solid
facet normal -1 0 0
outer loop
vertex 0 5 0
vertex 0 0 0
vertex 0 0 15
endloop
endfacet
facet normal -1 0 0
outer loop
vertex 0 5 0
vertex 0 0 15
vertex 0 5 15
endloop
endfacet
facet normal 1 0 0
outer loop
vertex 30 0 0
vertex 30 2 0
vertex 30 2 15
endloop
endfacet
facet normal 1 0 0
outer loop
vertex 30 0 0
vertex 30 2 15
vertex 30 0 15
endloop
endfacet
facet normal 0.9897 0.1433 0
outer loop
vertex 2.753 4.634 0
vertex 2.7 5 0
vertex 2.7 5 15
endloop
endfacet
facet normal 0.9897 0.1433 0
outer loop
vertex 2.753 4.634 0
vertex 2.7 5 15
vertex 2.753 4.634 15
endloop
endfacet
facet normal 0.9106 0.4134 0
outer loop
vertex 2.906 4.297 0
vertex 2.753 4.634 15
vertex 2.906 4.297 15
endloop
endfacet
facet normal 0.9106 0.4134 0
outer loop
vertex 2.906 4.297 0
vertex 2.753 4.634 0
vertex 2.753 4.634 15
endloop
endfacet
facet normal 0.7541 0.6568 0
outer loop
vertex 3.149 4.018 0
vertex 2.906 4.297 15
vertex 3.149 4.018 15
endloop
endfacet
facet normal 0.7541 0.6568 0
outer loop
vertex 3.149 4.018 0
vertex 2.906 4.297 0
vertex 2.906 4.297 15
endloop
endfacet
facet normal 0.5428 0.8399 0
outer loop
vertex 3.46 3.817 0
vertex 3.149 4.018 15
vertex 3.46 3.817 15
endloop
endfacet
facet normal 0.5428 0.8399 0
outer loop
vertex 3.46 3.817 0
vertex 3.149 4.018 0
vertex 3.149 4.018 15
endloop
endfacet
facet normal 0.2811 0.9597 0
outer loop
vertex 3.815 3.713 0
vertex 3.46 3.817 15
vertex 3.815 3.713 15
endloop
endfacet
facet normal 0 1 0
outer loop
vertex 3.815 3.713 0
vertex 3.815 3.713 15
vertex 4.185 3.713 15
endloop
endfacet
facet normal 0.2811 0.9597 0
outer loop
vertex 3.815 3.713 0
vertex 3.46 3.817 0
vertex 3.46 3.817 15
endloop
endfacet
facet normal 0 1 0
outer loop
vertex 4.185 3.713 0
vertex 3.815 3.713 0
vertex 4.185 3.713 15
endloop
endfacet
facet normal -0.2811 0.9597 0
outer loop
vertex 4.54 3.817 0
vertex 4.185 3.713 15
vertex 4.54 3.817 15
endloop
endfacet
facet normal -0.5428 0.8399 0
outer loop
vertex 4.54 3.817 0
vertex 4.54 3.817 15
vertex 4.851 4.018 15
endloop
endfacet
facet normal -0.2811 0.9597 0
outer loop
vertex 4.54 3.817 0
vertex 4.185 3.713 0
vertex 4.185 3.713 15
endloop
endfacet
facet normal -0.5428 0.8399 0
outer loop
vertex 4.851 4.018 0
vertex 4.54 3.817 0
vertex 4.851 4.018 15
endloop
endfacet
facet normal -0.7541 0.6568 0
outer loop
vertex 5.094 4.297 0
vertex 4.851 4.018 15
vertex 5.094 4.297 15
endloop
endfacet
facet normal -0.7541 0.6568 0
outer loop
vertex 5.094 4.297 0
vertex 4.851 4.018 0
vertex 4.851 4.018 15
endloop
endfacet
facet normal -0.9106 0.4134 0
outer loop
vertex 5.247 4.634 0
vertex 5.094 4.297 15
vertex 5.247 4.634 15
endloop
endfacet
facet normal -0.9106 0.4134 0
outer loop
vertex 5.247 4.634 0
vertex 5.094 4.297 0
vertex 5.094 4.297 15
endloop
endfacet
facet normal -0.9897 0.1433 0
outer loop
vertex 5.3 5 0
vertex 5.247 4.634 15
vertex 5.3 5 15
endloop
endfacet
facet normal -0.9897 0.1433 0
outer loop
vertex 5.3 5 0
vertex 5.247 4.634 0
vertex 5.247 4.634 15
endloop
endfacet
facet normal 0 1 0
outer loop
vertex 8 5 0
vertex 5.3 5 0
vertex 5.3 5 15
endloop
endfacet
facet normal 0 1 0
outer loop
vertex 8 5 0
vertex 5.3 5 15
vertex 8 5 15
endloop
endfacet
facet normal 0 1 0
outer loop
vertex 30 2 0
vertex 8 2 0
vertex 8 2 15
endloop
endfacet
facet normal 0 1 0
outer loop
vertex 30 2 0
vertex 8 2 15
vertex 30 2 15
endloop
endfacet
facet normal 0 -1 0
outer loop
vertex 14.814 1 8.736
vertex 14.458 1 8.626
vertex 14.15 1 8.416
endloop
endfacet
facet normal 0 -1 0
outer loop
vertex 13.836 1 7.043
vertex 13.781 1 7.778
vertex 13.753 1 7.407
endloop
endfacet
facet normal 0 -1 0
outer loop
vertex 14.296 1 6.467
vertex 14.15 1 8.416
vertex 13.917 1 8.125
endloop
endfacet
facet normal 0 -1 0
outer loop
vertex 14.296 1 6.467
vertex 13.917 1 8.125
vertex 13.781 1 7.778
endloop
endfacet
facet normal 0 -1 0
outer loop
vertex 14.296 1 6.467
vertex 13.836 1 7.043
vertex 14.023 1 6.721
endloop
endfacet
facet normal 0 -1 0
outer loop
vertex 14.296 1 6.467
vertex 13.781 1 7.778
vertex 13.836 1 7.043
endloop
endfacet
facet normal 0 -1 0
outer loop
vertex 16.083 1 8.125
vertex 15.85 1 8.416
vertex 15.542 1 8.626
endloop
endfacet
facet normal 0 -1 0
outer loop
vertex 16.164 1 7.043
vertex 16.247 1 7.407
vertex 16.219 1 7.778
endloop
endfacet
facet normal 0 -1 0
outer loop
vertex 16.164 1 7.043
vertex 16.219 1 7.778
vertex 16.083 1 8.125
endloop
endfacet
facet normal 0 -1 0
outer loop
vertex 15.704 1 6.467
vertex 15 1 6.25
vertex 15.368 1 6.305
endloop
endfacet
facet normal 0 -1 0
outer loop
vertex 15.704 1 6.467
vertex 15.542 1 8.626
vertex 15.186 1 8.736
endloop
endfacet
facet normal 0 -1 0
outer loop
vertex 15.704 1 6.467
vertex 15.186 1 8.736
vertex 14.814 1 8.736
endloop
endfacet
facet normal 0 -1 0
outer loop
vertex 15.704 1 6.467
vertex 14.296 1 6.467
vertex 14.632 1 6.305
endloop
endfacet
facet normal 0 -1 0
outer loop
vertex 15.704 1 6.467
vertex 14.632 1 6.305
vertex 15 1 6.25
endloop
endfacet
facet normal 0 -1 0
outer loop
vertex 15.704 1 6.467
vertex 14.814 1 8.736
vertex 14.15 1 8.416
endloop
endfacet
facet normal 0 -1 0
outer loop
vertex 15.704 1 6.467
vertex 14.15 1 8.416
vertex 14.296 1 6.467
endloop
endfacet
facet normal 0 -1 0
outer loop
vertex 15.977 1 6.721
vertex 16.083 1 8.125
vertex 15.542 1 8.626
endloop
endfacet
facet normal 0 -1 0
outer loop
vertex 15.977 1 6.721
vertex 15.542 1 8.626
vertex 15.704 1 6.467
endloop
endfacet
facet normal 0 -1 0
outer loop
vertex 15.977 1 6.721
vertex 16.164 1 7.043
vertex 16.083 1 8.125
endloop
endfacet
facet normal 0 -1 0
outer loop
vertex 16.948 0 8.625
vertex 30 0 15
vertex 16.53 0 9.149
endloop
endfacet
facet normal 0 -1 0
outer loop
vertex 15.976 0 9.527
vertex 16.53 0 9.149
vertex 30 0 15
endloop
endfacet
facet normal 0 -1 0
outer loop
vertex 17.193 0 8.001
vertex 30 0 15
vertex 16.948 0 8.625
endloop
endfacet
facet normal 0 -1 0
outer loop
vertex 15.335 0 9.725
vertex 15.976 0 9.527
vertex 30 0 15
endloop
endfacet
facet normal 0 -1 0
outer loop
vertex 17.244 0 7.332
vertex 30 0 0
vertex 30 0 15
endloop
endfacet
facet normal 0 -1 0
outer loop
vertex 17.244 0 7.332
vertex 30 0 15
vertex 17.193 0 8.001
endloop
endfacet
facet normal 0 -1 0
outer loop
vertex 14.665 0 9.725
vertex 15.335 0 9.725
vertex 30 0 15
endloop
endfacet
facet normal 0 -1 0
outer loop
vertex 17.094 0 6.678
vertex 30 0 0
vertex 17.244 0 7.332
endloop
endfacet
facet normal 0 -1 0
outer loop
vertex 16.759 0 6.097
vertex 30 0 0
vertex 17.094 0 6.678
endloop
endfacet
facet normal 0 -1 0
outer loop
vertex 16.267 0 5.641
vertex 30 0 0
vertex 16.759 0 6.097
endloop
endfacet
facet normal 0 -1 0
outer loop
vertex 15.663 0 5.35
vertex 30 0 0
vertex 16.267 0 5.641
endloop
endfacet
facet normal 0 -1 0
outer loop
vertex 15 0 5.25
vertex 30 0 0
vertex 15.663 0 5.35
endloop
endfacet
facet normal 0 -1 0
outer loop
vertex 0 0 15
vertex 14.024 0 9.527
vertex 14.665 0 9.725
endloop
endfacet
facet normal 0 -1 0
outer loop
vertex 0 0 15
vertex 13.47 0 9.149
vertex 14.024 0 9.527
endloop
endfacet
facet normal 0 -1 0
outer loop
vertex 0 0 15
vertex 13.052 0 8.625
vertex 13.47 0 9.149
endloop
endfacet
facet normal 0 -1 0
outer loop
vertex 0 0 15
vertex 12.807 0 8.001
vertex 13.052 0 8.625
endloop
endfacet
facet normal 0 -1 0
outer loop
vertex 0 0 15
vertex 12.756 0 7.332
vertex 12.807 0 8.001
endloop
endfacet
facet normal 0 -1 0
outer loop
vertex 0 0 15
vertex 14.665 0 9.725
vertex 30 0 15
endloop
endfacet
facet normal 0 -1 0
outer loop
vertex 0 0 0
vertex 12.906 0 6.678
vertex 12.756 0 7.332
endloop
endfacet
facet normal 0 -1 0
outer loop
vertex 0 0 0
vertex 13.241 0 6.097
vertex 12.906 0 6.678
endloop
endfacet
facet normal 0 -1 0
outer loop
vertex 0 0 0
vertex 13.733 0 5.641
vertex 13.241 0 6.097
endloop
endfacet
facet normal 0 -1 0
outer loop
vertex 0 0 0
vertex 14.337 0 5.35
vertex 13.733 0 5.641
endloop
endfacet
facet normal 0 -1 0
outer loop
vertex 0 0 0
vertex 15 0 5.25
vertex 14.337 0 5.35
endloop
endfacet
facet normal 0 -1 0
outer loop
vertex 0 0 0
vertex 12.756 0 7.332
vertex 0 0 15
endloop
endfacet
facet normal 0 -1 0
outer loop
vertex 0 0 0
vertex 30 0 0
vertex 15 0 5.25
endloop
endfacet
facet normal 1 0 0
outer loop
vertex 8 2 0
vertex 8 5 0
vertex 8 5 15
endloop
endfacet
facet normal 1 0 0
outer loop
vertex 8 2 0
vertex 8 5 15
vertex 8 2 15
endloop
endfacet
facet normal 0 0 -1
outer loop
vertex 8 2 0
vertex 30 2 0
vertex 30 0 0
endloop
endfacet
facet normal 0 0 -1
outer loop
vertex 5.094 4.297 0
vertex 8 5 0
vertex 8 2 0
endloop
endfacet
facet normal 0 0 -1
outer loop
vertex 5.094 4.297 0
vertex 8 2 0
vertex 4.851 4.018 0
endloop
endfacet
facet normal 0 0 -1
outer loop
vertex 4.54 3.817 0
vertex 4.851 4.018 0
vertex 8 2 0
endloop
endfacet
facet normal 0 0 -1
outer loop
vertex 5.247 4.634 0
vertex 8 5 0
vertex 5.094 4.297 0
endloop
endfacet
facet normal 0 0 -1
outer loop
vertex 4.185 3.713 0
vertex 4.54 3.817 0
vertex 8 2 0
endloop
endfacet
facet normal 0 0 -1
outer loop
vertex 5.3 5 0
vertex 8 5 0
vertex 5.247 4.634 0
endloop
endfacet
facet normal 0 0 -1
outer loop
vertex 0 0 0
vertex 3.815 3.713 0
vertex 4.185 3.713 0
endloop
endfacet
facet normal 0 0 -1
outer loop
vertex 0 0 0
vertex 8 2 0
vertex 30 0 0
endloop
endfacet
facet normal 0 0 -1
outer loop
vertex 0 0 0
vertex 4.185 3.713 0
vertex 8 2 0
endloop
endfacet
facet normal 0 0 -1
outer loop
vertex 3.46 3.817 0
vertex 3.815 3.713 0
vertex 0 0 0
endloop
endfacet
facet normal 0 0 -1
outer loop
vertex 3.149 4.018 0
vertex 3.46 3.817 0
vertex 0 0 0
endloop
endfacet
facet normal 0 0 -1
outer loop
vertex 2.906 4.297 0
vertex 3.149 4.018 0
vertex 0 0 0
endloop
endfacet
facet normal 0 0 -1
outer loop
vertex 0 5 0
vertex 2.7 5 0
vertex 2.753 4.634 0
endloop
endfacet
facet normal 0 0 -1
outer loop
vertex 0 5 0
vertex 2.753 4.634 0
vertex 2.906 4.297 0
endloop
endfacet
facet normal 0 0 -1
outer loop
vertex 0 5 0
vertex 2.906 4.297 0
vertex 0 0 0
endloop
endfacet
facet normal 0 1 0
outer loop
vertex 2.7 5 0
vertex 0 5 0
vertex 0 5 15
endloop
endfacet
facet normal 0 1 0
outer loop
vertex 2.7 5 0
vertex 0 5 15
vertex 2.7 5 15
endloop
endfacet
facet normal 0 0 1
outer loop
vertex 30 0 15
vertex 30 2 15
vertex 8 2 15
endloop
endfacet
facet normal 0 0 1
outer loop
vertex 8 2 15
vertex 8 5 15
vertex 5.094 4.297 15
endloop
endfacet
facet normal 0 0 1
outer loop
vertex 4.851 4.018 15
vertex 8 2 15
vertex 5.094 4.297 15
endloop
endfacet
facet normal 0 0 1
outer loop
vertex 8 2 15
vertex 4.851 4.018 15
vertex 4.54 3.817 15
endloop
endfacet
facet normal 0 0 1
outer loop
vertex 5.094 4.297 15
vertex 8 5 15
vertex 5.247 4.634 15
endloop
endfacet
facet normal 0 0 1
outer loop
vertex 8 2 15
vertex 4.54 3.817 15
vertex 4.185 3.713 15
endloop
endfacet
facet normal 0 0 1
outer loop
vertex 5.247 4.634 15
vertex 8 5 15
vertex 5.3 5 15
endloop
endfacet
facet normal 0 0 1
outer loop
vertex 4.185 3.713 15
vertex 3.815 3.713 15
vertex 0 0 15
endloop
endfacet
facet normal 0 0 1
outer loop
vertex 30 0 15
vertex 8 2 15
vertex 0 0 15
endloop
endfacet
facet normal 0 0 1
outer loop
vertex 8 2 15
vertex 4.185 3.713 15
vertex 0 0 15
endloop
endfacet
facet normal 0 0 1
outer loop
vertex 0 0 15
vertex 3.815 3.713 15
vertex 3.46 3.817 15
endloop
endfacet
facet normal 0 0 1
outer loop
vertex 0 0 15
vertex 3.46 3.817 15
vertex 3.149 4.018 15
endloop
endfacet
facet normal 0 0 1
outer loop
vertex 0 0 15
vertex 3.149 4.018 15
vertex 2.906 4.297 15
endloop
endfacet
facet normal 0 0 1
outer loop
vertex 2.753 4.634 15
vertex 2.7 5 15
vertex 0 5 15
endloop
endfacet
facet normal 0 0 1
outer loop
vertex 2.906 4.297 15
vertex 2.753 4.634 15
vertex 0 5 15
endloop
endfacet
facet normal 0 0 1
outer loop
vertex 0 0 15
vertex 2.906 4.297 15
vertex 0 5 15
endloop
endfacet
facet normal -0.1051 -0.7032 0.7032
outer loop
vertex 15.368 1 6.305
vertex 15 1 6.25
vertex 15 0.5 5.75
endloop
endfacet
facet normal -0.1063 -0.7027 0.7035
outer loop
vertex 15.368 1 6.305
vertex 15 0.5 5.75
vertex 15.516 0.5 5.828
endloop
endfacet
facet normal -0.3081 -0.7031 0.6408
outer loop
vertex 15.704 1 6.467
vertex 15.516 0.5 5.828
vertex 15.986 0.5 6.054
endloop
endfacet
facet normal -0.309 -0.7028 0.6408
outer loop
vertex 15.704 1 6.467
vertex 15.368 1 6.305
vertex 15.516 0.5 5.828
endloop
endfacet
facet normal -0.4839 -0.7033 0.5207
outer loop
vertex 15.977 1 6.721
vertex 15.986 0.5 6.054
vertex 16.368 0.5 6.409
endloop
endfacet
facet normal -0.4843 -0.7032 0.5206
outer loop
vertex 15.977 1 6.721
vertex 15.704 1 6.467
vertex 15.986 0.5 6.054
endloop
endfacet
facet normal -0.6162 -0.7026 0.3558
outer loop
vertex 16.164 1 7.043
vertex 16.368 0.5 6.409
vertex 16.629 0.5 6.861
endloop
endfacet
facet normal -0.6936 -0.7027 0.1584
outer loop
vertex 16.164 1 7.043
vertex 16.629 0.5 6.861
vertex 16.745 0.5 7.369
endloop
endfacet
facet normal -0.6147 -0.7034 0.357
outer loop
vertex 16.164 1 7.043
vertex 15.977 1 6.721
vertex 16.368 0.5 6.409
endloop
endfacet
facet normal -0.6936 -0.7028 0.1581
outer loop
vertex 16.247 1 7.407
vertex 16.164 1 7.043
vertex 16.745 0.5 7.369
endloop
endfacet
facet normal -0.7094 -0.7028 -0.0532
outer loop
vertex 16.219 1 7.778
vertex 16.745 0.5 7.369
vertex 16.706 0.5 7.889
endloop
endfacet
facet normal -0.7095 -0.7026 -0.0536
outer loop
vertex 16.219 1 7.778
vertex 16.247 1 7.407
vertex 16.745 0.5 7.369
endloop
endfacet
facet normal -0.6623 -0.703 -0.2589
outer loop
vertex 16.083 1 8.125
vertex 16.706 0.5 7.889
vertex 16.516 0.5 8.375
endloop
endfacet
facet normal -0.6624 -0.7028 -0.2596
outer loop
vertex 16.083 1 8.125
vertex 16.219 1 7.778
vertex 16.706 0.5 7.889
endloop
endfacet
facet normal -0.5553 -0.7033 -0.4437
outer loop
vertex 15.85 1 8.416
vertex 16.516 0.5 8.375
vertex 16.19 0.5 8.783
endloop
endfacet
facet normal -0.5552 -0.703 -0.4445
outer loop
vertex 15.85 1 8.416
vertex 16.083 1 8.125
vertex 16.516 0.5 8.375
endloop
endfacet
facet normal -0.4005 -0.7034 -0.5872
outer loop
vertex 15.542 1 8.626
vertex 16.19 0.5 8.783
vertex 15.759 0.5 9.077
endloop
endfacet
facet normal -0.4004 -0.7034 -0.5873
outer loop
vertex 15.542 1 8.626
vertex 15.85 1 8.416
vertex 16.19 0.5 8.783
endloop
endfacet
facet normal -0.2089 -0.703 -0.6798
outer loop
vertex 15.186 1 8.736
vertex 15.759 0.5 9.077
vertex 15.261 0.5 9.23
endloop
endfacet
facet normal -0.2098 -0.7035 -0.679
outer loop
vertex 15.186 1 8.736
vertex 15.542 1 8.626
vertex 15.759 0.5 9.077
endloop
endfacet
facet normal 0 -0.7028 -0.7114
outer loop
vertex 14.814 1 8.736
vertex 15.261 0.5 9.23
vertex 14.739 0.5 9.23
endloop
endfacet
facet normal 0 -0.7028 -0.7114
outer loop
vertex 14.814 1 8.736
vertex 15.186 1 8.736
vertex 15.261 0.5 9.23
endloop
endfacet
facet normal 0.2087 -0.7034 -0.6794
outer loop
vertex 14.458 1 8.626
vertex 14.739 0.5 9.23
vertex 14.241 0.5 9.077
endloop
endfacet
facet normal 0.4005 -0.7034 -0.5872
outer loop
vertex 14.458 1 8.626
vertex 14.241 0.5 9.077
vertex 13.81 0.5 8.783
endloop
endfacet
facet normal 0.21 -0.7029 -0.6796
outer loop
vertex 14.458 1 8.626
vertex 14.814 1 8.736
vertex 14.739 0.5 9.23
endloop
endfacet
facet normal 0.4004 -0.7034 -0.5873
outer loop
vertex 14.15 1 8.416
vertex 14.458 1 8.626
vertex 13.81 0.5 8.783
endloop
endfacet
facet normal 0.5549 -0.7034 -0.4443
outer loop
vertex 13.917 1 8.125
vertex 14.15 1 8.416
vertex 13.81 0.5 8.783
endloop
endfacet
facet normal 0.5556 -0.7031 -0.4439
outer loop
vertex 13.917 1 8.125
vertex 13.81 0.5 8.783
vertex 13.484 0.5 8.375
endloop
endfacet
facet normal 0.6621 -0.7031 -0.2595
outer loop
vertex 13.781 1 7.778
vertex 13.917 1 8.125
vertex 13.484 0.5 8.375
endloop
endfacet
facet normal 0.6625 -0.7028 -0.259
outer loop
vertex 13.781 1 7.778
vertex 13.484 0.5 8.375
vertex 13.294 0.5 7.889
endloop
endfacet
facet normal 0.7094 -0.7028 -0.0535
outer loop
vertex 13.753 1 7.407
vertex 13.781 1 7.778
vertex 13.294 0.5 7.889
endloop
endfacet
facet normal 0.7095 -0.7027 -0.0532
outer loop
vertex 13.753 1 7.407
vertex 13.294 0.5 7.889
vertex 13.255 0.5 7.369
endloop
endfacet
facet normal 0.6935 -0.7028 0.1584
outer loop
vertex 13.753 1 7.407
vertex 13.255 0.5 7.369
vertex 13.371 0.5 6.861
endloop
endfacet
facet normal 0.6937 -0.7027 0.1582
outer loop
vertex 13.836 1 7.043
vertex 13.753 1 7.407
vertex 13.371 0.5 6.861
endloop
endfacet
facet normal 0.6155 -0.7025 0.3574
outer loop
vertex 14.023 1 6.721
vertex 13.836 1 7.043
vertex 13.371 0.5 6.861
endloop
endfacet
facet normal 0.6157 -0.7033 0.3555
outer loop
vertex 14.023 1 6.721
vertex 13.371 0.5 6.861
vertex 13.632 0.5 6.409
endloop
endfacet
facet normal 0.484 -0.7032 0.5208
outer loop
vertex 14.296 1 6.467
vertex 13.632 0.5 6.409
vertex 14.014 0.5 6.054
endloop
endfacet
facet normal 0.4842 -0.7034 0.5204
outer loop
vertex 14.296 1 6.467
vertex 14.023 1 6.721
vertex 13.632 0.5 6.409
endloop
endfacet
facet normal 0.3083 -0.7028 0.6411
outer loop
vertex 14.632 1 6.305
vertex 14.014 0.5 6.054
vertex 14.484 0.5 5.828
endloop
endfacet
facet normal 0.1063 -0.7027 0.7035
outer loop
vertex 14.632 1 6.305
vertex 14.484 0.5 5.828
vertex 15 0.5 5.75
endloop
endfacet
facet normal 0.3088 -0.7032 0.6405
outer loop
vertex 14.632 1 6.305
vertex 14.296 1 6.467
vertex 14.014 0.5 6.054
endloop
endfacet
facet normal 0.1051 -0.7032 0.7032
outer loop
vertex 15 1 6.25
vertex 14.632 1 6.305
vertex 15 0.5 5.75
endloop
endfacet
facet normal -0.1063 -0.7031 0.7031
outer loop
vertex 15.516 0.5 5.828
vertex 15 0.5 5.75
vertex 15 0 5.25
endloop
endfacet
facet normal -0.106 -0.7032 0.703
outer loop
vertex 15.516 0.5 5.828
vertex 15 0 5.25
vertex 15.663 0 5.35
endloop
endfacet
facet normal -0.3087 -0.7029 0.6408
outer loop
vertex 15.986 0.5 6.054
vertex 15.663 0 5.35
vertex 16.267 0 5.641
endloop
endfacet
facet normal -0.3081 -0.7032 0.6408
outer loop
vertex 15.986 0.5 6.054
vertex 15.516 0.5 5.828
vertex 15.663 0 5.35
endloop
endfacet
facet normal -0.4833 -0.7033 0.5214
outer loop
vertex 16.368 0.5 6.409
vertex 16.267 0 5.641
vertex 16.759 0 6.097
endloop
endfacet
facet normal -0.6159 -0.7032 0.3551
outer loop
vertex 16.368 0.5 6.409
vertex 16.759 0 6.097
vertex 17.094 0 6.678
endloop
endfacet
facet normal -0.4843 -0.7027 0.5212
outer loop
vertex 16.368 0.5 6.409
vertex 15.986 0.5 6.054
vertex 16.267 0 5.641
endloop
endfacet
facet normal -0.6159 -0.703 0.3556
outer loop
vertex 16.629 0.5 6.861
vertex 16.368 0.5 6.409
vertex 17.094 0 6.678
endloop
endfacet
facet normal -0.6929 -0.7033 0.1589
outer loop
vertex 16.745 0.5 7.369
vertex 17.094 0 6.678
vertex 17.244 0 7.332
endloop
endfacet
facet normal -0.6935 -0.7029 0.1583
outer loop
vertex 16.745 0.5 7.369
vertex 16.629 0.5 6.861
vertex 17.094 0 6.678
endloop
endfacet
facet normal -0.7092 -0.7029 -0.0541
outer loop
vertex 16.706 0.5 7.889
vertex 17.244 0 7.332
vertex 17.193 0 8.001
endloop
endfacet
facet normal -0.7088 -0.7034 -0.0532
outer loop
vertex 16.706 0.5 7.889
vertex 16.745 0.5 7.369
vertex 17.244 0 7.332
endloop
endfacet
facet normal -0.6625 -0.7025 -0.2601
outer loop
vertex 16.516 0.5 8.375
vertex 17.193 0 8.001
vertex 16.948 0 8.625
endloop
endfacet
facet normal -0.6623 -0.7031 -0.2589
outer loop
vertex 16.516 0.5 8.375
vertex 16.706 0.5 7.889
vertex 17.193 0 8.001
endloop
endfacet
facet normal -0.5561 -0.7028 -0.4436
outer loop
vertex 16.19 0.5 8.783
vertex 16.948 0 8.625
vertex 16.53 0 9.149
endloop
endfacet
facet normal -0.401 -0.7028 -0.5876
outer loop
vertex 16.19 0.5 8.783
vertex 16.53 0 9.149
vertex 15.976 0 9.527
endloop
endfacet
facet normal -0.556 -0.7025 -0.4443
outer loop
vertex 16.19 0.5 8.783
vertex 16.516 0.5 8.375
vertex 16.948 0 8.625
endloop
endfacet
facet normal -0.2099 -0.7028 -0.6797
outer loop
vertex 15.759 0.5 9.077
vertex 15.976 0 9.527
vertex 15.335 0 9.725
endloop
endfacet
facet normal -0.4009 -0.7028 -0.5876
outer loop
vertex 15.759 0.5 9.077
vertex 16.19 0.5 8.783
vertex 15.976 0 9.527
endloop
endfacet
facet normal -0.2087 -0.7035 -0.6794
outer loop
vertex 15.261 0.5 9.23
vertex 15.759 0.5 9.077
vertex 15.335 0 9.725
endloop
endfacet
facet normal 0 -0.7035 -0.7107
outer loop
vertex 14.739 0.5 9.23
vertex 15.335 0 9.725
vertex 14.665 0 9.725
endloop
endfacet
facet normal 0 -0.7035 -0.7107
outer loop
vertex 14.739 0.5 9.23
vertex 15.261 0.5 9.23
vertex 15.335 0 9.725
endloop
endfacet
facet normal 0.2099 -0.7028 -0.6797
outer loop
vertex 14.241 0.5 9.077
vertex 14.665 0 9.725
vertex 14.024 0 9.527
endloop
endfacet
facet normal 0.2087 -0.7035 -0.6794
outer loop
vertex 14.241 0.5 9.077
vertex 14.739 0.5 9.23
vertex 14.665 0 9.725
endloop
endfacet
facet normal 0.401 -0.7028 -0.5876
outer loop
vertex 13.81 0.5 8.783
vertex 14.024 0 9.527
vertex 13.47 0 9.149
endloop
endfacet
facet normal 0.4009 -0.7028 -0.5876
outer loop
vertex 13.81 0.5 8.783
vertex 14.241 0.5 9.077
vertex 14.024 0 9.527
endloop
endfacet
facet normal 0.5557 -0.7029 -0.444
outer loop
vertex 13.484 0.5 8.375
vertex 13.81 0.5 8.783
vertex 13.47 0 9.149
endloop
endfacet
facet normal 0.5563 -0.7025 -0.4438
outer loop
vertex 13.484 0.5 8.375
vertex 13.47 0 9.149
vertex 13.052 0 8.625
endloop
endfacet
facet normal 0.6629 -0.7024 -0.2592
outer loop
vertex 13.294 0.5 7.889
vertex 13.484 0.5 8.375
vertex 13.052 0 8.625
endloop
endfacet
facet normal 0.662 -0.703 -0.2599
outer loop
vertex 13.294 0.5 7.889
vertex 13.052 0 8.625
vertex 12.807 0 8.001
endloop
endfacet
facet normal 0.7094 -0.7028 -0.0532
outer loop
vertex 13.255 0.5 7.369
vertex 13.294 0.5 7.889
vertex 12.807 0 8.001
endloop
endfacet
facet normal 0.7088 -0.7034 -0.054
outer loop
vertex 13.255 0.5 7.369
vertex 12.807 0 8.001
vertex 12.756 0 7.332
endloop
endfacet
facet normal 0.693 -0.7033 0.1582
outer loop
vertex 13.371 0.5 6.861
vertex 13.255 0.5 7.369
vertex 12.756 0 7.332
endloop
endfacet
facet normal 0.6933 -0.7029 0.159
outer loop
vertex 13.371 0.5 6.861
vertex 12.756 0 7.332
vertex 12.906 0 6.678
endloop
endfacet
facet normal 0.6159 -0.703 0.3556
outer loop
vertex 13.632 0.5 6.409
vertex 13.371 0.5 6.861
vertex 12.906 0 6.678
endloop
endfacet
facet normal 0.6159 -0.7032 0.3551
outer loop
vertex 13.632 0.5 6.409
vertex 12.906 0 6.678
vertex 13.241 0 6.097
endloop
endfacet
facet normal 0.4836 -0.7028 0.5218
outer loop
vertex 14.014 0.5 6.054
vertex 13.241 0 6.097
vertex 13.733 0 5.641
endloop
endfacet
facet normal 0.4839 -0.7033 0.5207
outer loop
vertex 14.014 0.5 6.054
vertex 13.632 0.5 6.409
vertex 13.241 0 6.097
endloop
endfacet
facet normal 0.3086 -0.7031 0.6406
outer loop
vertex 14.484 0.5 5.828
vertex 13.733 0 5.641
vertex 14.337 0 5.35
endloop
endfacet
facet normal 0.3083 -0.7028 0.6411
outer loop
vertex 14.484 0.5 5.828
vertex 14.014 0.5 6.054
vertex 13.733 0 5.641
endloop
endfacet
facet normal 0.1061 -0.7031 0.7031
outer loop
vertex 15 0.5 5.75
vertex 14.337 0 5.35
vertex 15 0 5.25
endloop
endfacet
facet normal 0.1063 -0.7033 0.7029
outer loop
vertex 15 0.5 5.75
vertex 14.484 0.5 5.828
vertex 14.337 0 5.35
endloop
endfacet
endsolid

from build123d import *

# Parameters (mm, degrees)
BOSS_EXTRUDE1_DEPTH = 15
SKETCH3_R           = 1.75
CUT_EXTRUDE1_DEPTH  = 1
CHAMFER1_SIZE       = 0.5


with BuildPart() as part:
    # Sketch2 → Boss-Extrude1 (new body)
    with BuildSketch(Plane.XY):
        with BuildLine():
            Line((0, 0), (0, 5))
            Line((0, 5), (2.7, 5))
            ThreePointArc((2.7, 5), (4, 3.7), (5.3, 5))
            Line((5.3, 5), (8, 5))
            Line((8, 5), (8, 2))
            Line((8, 2), (30, 2))
            Line((30, 2), (30, 0))
            Line((30, 0), (0, 0))
        make_face()
    extrude(amount=BOSS_EXTRUDE1_DEPTH)

    # Sketch3 → Cut-Extrude1 (cut)
    with BuildSketch(Plane.XZ):
        with Locations(Location((15, 7.5, 0), (0, 0, 270))):
            Circle(SKETCH3_R)
    extrude(amount=-CUT_EXTRUDE1_DEPTH, mode=Mode.SUBTRACT)

    # Chamfer1
    chamfer1_edges = [part.edges().sort_by_distance(p)[0] for p in [
        (15, 1, 9.25),
        (15, 0, 9.25),
    ]]
    chamfer(chamfer1_edges, length=CHAMFER1_SIZE - 0.0001)  # a hair under: the kernel refuses the full size


solid = part.part
